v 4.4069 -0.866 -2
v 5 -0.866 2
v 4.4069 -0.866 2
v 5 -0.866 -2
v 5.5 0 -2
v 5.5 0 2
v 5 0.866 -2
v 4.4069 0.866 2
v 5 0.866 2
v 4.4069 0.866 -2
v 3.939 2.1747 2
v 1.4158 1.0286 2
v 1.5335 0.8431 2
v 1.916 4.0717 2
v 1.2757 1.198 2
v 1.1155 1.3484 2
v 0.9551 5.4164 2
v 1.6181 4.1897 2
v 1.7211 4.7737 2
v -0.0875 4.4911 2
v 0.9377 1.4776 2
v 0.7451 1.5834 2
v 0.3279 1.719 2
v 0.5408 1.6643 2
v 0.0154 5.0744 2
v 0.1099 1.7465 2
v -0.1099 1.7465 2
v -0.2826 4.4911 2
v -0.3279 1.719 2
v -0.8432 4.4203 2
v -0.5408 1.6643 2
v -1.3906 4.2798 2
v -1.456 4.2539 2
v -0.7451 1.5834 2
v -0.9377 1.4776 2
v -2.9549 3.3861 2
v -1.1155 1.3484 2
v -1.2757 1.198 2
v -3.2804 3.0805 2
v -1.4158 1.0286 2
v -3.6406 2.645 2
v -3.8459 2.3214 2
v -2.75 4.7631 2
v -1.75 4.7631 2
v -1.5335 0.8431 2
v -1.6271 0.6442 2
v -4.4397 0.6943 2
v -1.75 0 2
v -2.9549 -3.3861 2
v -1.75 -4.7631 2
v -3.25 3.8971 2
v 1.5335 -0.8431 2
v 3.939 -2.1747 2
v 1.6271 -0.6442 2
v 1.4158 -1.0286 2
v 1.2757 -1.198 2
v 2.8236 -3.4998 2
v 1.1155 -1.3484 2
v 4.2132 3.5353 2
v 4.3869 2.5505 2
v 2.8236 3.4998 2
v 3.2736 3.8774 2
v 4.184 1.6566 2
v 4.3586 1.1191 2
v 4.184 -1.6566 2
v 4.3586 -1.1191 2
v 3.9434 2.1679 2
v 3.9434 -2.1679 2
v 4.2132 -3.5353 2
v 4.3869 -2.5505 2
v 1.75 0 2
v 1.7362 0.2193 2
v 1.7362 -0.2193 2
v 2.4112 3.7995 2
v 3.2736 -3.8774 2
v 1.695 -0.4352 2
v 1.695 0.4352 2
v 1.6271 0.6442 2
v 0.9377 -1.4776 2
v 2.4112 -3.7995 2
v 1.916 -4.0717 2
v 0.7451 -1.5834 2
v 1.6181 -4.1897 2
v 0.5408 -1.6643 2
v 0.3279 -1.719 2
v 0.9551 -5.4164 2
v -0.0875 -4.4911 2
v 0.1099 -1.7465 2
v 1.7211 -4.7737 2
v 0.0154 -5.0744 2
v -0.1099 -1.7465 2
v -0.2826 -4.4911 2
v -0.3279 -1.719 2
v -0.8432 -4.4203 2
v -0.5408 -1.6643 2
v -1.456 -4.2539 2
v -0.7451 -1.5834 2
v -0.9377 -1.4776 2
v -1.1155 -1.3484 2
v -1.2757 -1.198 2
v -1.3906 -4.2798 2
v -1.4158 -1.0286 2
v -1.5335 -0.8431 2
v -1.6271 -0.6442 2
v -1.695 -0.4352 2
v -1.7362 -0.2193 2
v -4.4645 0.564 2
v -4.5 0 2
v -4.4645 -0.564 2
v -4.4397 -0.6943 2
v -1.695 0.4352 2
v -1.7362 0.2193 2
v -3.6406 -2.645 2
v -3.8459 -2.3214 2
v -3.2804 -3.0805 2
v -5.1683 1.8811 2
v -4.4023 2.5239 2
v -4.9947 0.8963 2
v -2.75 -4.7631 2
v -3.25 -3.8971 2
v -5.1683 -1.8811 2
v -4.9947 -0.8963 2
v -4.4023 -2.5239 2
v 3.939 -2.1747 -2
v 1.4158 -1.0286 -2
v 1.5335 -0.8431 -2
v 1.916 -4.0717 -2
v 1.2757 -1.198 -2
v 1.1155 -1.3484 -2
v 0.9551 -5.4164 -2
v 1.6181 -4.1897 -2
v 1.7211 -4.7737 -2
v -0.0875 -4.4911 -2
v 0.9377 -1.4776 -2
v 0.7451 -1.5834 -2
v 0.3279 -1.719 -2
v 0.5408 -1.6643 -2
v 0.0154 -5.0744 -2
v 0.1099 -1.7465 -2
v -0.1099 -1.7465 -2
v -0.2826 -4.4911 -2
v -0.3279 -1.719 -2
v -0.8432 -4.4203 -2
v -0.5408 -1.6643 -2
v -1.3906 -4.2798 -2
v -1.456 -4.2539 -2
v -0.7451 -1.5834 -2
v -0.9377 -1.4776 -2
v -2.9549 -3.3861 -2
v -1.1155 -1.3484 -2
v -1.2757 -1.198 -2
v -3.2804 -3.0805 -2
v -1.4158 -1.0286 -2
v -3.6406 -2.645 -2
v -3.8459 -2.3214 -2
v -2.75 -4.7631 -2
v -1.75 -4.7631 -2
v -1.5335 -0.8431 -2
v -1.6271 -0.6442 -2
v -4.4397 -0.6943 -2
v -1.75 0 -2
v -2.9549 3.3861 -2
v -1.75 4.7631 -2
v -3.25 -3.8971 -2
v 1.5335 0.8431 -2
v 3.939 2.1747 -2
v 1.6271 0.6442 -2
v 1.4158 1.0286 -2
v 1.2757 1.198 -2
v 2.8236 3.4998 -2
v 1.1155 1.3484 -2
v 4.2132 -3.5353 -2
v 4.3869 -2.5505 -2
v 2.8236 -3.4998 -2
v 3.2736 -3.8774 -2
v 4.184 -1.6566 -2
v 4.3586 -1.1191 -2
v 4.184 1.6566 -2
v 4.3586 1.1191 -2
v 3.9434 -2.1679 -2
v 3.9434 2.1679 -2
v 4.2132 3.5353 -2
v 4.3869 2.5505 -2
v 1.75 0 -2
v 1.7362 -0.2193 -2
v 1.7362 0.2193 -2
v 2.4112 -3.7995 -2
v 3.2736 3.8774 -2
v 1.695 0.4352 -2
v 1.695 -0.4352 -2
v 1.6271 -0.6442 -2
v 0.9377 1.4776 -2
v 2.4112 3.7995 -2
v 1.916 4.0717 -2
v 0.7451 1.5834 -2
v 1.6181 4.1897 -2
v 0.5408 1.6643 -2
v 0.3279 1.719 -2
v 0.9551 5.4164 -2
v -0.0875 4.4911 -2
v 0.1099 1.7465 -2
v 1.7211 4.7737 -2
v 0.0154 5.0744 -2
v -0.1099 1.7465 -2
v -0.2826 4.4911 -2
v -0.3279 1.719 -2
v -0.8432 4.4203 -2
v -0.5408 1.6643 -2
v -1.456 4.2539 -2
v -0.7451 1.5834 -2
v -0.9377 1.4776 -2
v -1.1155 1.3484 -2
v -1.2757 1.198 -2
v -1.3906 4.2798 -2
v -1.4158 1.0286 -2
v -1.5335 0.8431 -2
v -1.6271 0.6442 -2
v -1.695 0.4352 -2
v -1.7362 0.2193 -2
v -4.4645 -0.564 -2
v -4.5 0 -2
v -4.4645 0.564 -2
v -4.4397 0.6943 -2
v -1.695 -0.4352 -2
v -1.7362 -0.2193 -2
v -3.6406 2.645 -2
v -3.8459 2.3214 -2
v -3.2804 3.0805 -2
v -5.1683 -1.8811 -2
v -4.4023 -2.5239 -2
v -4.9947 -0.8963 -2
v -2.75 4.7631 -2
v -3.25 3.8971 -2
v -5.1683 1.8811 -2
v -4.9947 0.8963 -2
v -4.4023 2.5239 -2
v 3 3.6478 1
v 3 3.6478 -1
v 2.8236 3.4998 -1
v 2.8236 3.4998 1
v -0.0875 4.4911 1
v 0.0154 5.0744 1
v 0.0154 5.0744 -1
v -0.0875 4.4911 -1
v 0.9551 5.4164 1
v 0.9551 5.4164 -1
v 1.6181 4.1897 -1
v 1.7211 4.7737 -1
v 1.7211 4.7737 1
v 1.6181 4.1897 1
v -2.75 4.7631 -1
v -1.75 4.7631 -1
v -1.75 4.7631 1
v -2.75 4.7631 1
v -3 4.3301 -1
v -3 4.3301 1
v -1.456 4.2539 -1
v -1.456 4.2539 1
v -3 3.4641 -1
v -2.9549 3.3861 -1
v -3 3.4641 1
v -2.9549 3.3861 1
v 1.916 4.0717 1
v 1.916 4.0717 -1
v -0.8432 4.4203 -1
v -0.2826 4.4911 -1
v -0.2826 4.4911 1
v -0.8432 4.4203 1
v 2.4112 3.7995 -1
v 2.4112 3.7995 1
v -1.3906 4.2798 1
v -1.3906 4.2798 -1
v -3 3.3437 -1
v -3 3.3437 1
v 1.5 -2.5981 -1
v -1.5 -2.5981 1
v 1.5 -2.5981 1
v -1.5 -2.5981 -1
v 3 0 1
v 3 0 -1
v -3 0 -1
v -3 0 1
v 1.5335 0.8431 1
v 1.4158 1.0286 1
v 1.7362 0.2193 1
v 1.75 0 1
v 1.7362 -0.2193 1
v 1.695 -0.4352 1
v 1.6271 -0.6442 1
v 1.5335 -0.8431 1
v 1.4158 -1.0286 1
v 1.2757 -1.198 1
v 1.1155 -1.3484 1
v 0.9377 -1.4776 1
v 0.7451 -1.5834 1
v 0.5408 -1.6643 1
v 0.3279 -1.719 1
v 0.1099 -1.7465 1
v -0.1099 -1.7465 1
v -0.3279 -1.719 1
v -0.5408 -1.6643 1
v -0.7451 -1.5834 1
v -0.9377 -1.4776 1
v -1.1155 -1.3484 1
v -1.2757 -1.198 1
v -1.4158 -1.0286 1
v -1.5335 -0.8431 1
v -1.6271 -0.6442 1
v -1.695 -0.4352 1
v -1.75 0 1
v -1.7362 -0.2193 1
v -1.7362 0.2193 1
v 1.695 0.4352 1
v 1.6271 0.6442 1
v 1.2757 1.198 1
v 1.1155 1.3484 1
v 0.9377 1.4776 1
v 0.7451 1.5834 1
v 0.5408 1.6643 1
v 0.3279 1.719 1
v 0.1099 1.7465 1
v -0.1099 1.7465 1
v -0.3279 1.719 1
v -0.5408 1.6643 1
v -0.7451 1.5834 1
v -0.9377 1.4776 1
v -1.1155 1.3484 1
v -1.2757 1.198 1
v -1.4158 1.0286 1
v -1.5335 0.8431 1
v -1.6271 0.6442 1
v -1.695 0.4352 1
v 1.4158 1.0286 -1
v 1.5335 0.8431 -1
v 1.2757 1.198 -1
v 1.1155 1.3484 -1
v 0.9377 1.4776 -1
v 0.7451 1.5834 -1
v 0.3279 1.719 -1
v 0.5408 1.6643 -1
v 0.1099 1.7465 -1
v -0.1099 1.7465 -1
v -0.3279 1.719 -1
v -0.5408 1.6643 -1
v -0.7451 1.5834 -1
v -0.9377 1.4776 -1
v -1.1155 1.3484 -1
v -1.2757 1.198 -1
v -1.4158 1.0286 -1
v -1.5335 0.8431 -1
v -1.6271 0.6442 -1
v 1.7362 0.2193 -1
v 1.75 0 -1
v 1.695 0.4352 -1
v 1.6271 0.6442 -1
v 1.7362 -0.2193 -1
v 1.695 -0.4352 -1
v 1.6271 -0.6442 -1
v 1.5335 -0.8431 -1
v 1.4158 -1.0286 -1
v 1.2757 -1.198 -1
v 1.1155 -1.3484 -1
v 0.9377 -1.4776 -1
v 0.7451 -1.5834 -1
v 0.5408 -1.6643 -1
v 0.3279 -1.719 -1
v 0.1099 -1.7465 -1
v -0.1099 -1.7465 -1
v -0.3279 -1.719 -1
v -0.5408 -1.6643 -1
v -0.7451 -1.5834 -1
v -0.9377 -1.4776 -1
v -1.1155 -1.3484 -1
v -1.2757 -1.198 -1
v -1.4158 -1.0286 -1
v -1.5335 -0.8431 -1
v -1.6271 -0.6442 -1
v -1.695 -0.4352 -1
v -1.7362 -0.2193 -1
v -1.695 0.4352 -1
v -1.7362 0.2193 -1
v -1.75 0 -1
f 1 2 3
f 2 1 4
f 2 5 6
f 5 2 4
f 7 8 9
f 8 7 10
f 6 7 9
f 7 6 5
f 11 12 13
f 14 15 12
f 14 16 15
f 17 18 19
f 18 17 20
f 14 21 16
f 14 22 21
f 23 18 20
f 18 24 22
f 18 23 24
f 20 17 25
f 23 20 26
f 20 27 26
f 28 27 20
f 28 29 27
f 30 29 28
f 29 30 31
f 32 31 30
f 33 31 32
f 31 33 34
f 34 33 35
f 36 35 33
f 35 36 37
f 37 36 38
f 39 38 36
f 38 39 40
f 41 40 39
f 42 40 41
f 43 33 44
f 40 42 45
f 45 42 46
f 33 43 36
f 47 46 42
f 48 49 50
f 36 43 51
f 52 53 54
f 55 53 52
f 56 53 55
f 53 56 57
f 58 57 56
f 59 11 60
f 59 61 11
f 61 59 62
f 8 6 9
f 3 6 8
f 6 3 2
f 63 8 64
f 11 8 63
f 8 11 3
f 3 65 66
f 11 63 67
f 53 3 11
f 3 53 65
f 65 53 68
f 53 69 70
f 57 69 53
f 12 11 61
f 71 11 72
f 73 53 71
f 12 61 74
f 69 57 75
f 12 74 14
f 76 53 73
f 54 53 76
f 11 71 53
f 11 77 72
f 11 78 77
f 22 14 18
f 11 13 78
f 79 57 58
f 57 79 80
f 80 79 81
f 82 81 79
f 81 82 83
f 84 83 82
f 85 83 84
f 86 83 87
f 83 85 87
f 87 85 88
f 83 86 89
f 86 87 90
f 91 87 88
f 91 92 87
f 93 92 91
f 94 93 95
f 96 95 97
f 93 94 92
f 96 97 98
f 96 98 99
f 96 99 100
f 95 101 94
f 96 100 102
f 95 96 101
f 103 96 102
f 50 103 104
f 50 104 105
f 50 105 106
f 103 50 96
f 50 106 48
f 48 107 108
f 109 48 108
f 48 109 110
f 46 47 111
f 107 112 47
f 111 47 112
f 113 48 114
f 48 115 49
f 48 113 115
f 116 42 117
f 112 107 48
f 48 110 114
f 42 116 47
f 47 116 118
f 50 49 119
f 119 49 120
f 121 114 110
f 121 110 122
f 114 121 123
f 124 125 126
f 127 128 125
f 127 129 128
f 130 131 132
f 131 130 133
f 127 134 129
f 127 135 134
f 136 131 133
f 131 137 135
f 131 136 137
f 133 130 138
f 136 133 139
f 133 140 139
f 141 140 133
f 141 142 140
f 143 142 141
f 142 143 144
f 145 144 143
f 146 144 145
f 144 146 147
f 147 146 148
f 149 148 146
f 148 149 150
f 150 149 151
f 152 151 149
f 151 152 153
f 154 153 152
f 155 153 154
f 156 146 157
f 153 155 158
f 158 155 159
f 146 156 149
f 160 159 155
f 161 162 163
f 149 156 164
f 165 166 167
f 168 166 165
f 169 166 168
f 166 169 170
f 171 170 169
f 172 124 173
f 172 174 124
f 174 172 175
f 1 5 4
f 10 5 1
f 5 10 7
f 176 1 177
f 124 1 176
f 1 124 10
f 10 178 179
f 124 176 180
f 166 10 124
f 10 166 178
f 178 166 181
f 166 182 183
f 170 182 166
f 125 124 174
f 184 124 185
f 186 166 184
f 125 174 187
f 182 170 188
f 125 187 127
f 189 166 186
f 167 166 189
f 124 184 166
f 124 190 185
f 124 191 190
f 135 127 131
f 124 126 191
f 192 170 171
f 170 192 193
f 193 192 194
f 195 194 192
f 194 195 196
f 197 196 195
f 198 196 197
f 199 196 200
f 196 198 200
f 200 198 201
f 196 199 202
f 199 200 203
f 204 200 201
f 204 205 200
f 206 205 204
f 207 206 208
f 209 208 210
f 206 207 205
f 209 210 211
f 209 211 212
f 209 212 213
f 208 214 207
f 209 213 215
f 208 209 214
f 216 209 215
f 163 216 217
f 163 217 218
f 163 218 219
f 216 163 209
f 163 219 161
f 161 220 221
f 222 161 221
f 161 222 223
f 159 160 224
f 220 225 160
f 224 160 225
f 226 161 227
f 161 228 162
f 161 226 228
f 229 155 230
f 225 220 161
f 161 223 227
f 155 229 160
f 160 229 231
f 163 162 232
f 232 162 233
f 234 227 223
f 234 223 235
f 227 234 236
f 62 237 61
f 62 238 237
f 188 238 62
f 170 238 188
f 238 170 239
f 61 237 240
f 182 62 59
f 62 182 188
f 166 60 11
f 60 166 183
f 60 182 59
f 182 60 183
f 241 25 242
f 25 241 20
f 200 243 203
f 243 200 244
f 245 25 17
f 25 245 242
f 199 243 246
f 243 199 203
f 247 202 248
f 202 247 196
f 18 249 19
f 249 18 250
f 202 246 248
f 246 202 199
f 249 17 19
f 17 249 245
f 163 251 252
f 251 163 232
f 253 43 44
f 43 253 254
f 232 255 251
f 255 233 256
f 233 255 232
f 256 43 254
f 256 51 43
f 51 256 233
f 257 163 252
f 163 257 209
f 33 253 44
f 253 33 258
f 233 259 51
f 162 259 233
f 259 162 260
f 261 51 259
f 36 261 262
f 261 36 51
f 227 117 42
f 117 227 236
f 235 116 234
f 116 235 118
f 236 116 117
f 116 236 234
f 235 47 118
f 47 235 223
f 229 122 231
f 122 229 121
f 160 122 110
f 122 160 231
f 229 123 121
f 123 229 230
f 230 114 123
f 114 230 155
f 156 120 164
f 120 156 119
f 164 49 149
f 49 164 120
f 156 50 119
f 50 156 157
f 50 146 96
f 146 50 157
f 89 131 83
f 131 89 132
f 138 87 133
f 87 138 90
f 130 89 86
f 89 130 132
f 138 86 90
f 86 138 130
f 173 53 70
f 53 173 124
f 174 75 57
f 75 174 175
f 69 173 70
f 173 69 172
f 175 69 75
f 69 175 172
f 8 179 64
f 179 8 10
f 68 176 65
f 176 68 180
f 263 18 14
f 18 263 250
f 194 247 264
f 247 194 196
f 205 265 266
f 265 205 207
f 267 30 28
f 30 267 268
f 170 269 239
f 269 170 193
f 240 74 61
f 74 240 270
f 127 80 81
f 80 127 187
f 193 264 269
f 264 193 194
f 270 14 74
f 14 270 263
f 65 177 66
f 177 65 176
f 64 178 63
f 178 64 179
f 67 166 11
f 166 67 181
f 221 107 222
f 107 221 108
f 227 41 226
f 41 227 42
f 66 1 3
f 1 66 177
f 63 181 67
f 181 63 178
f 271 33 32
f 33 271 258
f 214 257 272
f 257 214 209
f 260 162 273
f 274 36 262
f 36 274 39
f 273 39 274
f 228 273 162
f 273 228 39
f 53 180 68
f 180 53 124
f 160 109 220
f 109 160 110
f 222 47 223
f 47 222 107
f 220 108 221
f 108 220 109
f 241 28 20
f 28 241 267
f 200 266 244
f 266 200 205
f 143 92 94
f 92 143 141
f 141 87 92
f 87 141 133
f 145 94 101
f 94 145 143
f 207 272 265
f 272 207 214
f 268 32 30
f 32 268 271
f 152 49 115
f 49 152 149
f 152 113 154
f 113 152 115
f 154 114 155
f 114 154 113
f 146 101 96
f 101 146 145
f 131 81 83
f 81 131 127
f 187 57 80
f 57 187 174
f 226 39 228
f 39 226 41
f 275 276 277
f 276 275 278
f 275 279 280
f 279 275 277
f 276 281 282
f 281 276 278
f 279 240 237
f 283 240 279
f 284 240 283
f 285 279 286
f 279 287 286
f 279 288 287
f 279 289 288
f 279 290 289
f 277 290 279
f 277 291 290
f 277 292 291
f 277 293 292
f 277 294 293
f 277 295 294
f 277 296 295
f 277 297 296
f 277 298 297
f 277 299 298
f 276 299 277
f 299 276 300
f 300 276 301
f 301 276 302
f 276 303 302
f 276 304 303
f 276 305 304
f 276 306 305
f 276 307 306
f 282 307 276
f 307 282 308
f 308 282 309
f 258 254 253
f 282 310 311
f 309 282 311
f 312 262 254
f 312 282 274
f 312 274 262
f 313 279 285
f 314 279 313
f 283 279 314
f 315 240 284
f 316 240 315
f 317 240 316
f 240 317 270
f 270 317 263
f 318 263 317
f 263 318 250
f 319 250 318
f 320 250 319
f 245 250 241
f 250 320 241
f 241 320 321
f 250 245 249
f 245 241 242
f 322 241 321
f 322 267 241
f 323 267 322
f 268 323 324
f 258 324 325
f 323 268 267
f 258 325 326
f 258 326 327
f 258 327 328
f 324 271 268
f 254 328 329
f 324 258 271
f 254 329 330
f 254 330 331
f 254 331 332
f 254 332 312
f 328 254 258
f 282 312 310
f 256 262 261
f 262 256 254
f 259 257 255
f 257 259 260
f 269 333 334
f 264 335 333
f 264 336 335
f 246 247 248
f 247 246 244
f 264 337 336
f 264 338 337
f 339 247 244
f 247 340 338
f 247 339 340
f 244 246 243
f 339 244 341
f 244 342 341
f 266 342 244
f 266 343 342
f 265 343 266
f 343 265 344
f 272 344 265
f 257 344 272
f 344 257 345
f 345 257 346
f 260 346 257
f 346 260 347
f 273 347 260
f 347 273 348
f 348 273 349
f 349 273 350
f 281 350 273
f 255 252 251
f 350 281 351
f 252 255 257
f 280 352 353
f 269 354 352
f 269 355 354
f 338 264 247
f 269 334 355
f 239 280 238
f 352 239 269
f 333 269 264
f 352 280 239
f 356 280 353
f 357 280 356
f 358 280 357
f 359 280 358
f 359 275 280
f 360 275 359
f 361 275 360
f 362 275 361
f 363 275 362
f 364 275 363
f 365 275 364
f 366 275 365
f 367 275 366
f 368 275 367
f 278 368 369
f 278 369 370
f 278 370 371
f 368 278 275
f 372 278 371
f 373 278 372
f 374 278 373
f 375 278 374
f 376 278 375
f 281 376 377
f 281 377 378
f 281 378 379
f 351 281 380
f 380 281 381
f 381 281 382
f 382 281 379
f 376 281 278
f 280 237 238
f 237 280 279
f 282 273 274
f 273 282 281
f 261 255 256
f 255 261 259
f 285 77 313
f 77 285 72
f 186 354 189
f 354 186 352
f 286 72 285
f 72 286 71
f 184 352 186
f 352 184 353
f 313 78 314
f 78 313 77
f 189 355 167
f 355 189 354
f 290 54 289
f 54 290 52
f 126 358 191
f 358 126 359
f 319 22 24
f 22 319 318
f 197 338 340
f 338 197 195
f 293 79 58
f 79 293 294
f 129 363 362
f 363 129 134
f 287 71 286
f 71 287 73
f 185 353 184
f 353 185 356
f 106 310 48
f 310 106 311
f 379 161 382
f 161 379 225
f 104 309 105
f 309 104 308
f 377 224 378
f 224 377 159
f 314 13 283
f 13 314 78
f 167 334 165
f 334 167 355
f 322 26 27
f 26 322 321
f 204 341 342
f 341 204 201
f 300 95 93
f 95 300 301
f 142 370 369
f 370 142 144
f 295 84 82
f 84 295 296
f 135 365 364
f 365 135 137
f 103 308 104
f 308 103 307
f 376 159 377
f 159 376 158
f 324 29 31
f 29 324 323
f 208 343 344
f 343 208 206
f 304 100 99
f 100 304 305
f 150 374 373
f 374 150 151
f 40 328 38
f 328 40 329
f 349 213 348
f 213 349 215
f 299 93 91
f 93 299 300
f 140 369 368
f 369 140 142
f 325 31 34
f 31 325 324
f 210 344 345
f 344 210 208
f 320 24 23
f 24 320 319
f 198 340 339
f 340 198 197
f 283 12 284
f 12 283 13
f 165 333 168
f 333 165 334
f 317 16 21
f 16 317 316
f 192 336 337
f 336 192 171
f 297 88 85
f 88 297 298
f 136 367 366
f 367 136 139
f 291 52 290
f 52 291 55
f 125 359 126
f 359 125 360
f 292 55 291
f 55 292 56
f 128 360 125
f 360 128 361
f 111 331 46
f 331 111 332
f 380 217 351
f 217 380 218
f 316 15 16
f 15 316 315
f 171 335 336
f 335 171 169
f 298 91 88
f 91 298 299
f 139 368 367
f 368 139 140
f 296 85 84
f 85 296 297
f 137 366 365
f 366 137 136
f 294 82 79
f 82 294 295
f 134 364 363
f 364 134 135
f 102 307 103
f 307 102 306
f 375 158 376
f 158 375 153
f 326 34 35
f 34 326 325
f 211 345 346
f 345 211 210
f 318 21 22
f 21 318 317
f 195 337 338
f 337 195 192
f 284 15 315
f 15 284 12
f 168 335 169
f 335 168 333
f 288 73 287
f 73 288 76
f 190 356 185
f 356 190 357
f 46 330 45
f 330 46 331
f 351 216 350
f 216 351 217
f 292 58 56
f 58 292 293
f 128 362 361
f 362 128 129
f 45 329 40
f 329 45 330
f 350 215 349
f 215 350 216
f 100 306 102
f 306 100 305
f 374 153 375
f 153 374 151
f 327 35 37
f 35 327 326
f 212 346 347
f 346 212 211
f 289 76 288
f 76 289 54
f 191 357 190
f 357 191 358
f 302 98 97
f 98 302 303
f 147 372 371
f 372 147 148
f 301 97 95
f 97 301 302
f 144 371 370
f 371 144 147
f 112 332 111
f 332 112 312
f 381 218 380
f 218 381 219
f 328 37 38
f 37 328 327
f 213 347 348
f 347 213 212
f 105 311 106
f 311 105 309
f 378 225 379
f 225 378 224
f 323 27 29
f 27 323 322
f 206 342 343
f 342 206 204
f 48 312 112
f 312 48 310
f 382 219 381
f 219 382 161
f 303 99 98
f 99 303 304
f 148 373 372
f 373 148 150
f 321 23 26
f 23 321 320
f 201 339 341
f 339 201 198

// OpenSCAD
//
// Nut Holder for 3mm nuts
//

//General Settings:

$fn = 50;

//Global variables:

nh_NutDiameter = 6;
nh_BoltDiameter = 3;
nh_NutHeight = 2;

nh_GripDiameter = nh_NutDiameter*1.5;
nh_GripHeight = nh_NutHeight+2;
nh_GripRilsDiameter = 2;


//Modules:
// module nut(){
// 	difference(){
// 		cylinder(d=nh_NutDiameter, h=nh_NutHeight, $fn = 6, center = true);
// 		cylinder(d=nh_BoltDiameter+0.5, h=nh_NutHeight*1.1, center=true);
// 	}
// }

module Grip(){

	cylinder(d=nh_GripDiameter, h=nh_GripHeight, center=true);
	for(i=[0:nh_GripDiameter]){
		rotate([0, 0, i*360/nh_GripDiameter]) translate([nh_GripDiameter/2, 0, 0]) cylinder(d=nh_GripRilsDiameter, h=nh_GripHeight, center=true, $fn = 6);
	}
}

module GriCarve(){
	cylinder(d=nh_NutDiameter, h=nh_NutHeight, $fn = 6, center = true);
	translate([0,nh_GripDiameter/2,0]) cube([nh_NutDiameter, nh_GripDiameter, nh_NutHeight], center=true);
}

difference() {
	Grip();
	GriCarve();
	cylinder(d=nh_BoltDiameter+0.5, h=nh_GripHeight*1.1, center=true);
}
